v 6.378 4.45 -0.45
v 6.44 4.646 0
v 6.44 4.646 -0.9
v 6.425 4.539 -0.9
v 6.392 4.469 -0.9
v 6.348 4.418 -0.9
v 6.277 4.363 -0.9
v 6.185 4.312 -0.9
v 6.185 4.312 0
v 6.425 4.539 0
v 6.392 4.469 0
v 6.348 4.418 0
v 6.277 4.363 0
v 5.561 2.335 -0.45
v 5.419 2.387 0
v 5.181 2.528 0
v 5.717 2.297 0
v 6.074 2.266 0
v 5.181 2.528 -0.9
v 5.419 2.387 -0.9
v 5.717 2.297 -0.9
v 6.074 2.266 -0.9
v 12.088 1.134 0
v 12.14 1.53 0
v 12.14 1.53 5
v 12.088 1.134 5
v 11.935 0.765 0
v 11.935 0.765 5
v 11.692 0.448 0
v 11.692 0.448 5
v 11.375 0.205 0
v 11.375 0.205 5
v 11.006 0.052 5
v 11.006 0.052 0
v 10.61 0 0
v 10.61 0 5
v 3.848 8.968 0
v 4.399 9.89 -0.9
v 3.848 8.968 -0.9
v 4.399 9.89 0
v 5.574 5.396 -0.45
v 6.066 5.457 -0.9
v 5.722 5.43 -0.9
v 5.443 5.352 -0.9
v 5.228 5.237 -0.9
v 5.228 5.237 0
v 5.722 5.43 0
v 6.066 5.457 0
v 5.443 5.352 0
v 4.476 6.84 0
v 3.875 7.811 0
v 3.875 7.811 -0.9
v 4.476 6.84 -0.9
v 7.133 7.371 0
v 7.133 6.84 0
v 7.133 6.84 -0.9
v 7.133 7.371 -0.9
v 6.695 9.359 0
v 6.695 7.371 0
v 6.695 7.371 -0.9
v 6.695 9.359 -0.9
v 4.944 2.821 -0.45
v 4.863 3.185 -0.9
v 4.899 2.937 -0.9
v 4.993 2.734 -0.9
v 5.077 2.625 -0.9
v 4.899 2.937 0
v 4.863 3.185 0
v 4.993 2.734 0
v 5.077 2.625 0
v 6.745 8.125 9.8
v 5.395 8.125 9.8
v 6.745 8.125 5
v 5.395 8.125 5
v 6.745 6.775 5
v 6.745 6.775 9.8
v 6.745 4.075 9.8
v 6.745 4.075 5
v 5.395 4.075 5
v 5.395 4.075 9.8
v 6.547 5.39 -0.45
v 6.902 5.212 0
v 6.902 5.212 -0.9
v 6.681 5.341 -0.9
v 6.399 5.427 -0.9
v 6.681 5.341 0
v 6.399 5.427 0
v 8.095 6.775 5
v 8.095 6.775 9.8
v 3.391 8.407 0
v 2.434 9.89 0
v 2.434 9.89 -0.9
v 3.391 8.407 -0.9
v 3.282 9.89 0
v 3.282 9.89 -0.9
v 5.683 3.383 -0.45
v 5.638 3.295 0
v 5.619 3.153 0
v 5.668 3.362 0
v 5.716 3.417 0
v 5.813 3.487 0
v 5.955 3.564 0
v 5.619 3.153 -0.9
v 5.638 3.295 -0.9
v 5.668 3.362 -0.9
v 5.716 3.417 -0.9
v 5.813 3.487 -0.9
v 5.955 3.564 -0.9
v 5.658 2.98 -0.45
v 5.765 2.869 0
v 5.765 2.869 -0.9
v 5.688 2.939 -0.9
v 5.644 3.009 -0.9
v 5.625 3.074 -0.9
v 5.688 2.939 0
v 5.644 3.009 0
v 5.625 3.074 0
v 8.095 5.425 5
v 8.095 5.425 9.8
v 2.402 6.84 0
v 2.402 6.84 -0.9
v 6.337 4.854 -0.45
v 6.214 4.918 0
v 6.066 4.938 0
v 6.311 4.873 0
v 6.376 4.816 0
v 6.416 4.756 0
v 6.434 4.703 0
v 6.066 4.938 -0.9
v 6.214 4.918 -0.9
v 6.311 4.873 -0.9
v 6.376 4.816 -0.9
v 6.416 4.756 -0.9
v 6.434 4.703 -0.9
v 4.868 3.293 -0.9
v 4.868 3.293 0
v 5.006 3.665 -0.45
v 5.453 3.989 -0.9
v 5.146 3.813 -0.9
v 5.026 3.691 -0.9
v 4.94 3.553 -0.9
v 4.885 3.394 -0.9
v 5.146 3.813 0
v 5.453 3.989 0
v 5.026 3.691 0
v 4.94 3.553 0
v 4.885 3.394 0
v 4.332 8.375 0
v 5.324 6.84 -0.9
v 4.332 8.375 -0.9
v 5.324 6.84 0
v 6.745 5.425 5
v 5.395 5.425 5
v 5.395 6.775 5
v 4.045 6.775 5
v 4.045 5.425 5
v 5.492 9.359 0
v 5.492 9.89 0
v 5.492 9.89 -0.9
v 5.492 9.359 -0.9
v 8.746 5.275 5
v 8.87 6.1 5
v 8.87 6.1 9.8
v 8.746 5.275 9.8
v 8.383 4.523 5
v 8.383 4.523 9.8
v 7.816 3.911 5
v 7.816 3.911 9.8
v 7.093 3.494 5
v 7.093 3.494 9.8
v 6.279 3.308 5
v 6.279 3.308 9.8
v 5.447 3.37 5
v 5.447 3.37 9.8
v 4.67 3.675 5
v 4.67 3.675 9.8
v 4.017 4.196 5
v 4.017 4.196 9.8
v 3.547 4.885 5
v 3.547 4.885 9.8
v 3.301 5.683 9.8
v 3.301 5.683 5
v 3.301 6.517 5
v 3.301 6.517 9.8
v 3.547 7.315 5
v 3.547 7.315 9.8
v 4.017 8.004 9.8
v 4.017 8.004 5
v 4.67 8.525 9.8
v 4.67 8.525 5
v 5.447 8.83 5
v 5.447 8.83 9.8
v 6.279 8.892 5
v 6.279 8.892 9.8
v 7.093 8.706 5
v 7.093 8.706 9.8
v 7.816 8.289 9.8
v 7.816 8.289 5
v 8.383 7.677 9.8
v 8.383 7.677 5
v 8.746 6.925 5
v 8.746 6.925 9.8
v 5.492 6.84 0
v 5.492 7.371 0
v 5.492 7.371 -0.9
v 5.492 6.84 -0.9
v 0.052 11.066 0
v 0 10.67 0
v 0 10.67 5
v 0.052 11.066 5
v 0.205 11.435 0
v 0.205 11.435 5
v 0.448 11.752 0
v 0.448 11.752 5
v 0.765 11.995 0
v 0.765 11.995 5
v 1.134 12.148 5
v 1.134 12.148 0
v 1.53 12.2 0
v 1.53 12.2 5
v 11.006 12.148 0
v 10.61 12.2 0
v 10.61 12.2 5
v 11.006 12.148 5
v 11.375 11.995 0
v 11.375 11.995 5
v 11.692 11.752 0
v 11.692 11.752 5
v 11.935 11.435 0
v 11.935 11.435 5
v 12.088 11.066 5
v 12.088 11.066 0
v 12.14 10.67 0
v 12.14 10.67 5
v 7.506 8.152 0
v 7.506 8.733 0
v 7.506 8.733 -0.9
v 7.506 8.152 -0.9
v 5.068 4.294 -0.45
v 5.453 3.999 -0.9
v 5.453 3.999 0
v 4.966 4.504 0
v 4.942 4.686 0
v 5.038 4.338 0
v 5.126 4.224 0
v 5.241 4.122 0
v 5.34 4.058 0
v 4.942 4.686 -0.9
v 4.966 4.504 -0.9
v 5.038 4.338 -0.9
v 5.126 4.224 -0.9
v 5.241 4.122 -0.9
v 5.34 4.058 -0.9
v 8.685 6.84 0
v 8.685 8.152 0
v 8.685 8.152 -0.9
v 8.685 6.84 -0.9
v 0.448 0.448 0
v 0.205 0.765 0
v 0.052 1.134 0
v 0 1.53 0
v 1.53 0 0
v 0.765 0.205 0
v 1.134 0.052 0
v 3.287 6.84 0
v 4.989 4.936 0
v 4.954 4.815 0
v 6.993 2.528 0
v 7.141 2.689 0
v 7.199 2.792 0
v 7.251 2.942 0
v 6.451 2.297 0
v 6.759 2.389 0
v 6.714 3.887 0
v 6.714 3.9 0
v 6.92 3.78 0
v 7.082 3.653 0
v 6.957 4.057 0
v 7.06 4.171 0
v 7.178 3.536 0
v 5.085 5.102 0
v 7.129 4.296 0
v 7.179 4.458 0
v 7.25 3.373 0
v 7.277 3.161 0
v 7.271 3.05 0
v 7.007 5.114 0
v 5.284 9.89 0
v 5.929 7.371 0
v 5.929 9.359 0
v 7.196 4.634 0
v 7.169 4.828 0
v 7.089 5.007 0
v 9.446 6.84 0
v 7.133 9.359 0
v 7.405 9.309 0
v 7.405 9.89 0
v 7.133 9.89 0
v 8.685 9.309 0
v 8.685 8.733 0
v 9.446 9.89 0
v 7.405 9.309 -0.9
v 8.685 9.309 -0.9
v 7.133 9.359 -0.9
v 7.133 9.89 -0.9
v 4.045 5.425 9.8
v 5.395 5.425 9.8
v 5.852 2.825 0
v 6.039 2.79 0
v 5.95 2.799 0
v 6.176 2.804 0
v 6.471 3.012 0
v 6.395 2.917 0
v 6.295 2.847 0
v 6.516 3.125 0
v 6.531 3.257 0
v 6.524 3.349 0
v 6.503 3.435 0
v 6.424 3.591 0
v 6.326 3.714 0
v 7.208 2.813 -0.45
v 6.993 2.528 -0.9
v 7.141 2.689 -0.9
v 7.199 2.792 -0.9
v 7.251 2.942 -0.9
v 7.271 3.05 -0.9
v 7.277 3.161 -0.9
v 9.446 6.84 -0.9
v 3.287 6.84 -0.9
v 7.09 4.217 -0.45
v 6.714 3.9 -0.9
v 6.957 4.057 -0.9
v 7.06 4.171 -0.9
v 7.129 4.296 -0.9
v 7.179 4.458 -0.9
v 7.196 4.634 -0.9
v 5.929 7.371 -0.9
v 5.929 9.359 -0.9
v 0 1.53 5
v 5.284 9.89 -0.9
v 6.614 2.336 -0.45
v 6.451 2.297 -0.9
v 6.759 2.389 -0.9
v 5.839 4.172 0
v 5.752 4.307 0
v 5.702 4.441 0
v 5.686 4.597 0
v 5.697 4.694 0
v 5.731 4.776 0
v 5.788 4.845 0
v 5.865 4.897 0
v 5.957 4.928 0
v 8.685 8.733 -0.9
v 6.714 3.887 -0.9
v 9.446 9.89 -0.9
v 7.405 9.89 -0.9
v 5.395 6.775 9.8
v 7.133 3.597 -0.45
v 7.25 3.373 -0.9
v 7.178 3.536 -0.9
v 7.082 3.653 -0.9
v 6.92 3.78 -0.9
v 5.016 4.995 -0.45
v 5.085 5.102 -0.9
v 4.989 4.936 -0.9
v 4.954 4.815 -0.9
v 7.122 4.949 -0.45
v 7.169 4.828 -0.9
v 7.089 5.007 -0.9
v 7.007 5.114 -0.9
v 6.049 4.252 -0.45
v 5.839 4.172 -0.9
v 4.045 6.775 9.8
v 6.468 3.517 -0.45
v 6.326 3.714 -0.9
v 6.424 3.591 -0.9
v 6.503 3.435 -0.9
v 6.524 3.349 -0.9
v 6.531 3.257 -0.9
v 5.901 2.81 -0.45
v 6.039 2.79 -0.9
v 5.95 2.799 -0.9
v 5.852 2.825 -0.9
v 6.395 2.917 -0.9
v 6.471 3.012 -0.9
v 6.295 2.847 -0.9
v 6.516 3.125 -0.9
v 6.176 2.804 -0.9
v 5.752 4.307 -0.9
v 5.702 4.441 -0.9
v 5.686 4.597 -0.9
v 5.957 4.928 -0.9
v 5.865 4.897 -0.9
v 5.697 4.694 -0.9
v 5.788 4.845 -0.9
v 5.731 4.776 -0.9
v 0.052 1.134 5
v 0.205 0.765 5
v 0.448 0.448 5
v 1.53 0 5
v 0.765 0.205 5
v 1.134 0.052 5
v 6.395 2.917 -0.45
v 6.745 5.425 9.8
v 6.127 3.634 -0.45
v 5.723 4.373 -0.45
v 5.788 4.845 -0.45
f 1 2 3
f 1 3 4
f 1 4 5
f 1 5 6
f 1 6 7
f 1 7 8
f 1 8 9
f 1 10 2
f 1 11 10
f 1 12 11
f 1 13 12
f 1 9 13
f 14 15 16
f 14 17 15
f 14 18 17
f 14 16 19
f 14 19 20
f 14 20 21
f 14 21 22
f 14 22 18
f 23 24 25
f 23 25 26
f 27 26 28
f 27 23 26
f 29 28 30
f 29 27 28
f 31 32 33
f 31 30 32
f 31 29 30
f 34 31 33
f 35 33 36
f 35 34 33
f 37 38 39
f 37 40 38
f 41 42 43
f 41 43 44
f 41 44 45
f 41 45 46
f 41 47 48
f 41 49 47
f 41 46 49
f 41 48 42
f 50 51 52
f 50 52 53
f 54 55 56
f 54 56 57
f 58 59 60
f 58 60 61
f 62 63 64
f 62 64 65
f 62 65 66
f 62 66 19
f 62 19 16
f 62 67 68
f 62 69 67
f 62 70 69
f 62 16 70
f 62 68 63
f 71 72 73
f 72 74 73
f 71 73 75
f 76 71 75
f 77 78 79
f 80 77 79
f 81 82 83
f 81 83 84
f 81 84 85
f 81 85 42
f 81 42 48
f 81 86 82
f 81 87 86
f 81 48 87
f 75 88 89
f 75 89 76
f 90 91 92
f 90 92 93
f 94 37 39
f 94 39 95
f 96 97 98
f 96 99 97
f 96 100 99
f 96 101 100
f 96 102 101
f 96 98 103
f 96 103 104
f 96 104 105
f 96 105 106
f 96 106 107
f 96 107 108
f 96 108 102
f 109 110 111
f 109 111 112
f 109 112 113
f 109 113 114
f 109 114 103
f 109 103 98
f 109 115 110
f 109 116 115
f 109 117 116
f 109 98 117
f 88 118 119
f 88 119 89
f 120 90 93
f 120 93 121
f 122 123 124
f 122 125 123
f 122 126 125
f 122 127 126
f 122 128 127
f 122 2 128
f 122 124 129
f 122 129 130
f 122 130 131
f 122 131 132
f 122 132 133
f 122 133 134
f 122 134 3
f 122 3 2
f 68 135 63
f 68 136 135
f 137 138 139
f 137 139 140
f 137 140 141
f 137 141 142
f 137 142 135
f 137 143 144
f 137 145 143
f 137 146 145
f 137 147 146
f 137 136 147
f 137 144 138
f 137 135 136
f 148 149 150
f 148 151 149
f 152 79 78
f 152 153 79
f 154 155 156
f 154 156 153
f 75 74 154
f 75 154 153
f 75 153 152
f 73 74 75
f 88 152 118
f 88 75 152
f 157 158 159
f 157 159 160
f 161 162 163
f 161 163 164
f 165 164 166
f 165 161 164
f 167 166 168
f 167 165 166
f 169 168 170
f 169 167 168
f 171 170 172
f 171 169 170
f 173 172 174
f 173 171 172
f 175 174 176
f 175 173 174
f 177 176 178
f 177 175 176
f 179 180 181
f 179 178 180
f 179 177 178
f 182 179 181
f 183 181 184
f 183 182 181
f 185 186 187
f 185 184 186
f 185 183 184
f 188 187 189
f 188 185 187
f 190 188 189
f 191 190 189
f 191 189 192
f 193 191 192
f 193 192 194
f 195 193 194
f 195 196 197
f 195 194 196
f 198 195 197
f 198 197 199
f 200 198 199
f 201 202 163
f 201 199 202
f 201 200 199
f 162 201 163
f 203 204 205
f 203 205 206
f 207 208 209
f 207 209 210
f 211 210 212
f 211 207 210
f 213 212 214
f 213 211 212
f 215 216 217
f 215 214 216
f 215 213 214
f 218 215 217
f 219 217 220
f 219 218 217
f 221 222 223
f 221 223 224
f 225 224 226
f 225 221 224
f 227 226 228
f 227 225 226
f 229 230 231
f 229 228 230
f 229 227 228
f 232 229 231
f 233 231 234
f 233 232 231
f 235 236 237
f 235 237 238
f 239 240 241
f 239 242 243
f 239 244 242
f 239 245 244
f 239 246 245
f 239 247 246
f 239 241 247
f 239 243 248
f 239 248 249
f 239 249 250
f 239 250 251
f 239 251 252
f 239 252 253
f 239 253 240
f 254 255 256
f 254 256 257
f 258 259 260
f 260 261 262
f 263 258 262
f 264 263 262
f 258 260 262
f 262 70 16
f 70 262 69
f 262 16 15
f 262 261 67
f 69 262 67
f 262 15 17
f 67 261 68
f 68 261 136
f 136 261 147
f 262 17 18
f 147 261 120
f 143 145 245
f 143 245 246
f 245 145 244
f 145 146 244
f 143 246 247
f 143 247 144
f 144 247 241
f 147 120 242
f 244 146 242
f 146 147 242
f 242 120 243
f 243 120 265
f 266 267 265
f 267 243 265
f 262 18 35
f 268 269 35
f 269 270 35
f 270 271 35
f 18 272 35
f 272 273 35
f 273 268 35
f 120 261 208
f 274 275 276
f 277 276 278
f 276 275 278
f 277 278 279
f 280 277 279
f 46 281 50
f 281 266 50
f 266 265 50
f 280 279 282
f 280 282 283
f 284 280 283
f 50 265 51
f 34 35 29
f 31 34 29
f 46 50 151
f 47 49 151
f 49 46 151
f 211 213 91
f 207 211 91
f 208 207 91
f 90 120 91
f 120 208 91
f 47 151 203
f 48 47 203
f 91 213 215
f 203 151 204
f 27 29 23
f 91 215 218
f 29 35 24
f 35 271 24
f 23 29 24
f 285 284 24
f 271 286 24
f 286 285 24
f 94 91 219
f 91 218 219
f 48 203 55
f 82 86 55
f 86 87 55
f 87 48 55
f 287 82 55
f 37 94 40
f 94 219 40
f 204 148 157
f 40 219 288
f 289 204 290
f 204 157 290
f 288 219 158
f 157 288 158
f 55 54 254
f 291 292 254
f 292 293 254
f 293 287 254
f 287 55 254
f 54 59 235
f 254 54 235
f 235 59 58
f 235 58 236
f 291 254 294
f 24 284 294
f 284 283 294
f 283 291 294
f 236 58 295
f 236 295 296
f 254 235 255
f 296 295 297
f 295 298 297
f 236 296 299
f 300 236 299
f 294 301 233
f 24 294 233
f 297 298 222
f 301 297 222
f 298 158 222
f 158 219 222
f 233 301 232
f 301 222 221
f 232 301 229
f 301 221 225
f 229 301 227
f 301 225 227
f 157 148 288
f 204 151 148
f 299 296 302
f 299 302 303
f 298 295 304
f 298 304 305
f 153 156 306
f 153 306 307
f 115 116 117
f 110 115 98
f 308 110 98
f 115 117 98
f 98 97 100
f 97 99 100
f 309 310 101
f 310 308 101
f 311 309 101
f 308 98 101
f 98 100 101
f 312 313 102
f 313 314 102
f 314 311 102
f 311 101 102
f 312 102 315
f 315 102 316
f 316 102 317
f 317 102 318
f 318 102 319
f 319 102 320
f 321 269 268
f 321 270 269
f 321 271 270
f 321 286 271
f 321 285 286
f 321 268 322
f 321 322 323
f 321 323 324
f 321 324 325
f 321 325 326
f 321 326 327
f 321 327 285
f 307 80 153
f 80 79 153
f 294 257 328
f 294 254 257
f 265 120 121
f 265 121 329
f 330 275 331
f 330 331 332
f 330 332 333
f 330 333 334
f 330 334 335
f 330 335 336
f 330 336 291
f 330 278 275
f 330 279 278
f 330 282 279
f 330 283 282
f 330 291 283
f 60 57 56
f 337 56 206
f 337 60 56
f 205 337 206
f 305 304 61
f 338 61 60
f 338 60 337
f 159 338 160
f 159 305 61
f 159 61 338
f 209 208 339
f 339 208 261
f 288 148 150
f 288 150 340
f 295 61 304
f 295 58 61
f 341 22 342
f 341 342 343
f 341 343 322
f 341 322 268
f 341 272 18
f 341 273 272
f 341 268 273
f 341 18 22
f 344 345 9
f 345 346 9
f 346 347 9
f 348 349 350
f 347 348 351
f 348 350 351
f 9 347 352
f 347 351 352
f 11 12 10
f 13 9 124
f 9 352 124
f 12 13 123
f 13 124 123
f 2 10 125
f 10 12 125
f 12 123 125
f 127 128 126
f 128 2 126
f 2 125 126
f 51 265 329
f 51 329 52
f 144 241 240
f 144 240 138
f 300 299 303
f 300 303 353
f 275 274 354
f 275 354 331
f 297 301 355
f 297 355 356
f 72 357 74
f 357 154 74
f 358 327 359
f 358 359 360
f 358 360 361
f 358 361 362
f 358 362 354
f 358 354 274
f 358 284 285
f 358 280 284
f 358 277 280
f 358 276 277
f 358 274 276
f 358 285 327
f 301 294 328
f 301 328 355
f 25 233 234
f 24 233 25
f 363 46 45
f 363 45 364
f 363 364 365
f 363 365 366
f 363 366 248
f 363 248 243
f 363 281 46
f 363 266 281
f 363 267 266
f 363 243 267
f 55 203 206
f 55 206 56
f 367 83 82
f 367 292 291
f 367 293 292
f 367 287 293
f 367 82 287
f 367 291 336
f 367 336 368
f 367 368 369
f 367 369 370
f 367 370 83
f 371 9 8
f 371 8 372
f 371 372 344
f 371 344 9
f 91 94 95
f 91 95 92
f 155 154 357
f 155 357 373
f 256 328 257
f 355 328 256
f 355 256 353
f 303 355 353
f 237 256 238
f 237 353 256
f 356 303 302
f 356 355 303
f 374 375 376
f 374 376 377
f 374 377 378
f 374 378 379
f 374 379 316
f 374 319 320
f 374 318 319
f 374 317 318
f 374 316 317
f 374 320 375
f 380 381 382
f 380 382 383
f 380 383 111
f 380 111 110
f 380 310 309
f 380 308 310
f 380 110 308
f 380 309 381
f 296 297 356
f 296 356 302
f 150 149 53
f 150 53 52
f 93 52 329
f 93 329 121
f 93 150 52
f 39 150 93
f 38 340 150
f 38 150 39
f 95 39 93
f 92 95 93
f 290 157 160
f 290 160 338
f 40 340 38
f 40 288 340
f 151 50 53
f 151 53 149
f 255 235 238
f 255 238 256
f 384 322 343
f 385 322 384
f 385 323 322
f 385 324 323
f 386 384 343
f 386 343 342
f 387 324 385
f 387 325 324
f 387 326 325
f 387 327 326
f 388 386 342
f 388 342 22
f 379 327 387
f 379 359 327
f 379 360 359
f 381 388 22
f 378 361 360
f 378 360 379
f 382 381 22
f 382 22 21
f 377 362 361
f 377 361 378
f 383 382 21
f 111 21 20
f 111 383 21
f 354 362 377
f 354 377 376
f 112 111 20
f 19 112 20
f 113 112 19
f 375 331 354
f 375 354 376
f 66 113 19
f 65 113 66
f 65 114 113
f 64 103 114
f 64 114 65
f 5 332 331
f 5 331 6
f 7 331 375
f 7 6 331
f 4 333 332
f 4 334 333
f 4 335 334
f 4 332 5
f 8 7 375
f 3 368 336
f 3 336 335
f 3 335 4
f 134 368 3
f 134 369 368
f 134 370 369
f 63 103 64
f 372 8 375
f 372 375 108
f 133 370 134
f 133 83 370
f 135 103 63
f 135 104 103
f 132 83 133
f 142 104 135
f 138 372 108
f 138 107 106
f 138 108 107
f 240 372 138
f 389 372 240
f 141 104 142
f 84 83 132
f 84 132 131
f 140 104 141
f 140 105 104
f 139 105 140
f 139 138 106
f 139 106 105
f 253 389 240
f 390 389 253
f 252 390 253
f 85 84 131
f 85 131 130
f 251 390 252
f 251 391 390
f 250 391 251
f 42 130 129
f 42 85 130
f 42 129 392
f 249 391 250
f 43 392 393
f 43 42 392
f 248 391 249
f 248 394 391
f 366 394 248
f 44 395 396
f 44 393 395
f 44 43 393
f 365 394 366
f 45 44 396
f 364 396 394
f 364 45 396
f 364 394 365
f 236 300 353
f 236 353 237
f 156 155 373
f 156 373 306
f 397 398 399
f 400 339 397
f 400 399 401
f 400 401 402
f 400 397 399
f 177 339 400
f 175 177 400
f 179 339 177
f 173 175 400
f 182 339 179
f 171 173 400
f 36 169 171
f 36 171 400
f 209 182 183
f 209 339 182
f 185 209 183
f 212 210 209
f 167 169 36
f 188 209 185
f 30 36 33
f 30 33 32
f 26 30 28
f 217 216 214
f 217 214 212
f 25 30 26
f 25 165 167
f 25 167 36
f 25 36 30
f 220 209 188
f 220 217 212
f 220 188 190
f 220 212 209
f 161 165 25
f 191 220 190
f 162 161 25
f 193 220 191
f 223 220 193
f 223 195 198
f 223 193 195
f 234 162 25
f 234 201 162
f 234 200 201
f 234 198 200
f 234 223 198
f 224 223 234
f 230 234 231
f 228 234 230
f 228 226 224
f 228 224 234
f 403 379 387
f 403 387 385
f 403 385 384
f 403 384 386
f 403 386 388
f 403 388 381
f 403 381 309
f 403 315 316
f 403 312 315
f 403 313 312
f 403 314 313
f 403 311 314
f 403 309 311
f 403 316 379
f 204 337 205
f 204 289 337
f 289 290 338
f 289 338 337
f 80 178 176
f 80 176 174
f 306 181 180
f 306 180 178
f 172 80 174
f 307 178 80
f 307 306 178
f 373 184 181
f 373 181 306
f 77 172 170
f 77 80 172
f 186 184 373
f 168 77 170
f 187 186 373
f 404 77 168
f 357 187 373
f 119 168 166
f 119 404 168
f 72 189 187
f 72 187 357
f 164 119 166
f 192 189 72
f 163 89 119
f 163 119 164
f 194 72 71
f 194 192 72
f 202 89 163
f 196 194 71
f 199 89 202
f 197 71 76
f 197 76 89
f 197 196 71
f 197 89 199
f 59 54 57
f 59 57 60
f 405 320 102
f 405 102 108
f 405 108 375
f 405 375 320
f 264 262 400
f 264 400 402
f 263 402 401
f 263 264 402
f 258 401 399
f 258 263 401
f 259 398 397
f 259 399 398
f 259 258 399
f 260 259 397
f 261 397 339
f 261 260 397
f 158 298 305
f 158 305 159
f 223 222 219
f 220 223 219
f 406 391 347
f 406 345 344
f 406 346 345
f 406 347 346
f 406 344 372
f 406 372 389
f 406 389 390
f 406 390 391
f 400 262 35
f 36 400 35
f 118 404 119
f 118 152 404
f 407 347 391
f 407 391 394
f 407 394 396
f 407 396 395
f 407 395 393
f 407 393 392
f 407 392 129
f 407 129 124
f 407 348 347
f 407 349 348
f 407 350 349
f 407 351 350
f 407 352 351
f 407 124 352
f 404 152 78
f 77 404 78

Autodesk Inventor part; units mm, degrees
ref_plane "YZ Plane" through (0, 0, 0) normal (1, 0, 0) x (0, 1, 0)
ref_plane "XZ Plane" through (0, 0, 0) normal (0, 1, 0) x (-1, 0, 0)
sketch "Sketch1" plane through (0, 0, 0) normal (0, 0, 1) x (1, 0, 0)
  line L0 (14.6962, 12.74) -> (14.6962, 0) construction
  line L1 (10.61, 12.2) -> (1.53, 12.2)
  arc A0 (1.53, 12.2) -> (0, 10.67) centre (1.53, 10.67) ccw
  line L2 (0, 10.67) -> (0, 1.53)
  arc A1 (0, 1.53) -> (1.53, 0) centre (1.53, 1.53) ccw
  line L3 (1.53, 0) -> (10.61, 0)
  arc A2 (10.61, 0) -> (12.14, 1.53) centre (10.61, 1.53) ccw
  arc A3 (12.14, 10.67) -> (10.61, 12.2) centre (10.61, 10.67) ccw
  line L4 (12.14, 10.67) -> (12.14, 1.53)
  point P0 (0, 0)
  point P1 (0, 0)
  dimension "d10" = 12.74
ref_plane "Work Plane1" through (0, 0, 5) normal (0, 0, 1) x (1, 0, 0)
sketch "Sketch2" plane through (0, 0, 5) normal (0, 0, 1) x (1, 0, 0)
  line L0 (10.88, 12.74) -> (1.8, 12.74) projected
  line L1 (10.88, 12.74) -> (1.8, 12.74) projected
  arc A0 (1.8, 12.74) -> (0, 10.94) centre (1.8, 10.94) ccw projected
  line L2 (0, 10.94) -> (0, 1.8) projected
  arc A1 (0, 1.8) -> (1.8, 0) centre (1.8, 1.8) ccw projected
  line L3 (1.8, 0) -> (10.88, 0) projected
  arc A2 (10.88, 0) -> (12.68, 1.8) centre (10.88, 1.8) ccw projected
  line L4 (12.68, 1.8) -> (12.68, 10.94) projected
  arc A3 (12.68, 10.94) -> (10.88, 12.74) centre (10.88, 10.94) ccw projected
  circle A4 centre (6.34, 6.37) radius 2.8
  line L5 (5.665, 8.395) -> (7.015, 8.395)
  line L6 (7.015, 4.345) -> (5.665, 4.345)
  line L7 (5.665, 4.345) -> (7.015, 8.395) construction
  line L8 (5.665, 8.395) -> (7.015, 4.345) construction
  line L9 (8.365, 5.695) -> (8.365, 7.045)
  line L10 (4.315, 7.045) -> (4.315, 5.695)
  line L11 (4.315, 5.695) -> (8.365, 7.045) construction
  line L12 (8.365, 5.695) -> (4.315, 7.045) construction
  line L13 (4.315, 5.695) -> (5.665, 5.695)
  line L14 (7.015, 5.695) -> (8.365, 5.695)
  line L15 (5.665, 4.345) -> (5.665, 5.695)
  line L16 (5.665, 7.045) -> (5.665, 8.395)
  line L17 (8.365, 7.045) -> (7.015, 7.045)
  line L18 (5.665, 7.045) -> (4.315, 7.045)
  line L19 (7.015, 8.395) -> (7.015, 7.045)
  line L20 (7.015, 5.695) -> (7.015, 4.345)
  point P0 (0, 0)
  dimension "d3" = 5.6
  dimension "d4" = 4.05
  dimension "d5" = 1.35
  dimension "d6" = 4.05
  dimension "d7" = 1.35
extrude "Extrusion3" add sketch "Sketch1" along normal blind 5
sketch "Sketch3" plane through (0, 0, 5) normal (0, 0, 1) x (1, 0, 0)
  line L0 (10.61, 12.47) -> (1.53, 12.47)
  line L1 (10.61, 12.47) -> (1.53, 12.47)
  arc A0 (1.53, 12.47) -> (-0.27, 10.67) centre (1.53, 10.67) ccw
  line L2 (-0.27, 10.67) -> (-0.27, 1.53)
  arc A1 (-0.27, 1.53) -> (1.53, -0.27) centre (1.53, 1.53) ccw
  line L3 (1.53, -0.27) -> (10.61, -0.27)
  arc A2 (10.61, -0.27) -> (12.41, 1.53) centre (10.61, 1.53) ccw
  line L4 (12.41, 1.53) -> (12.41, 10.67)
  arc A3 (12.41, 10.67) -> (10.61, 12.47) centre (10.61, 10.67) ccw
  circle A4 centre (6.07, 6.1) radius 2.8
  line L5 (5.395, 8.125) -> (6.745, 8.125)
  line L6 (6.745, 4.075) -> (5.395, 4.075)
  line L7 (5.395, 4.075) -> (6.745, 8.125) construction
  line L8 (5.395, 8.125) -> (6.745, 4.075) construction
  line L9 (8.095, 5.425) -> (8.095, 6.775)
  line L10 (4.045, 6.775) -> (4.045, 5.425)
  line L11 (4.045, 5.425) -> (8.095, 6.775) construction
  line L12 (8.095, 5.425) -> (4.045, 6.775) construction
  line L13 (4.045, 5.425) -> (5.395, 5.425)
  line L14 (6.745, 5.425) -> (8.095, 5.425)
  line L15 (5.395, 4.075) -> (5.395, 5.425)
  line L16 (5.395, 6.775) -> (5.395, 8.125)
  line L17 (8.095, 6.775) -> (6.745, 6.775)
  line L18 (5.395, 6.775) -> (4.045, 6.775)
  line L19 (6.745, 8.125) -> (6.745, 6.775)
  line L20 (6.745, 5.425) -> (6.745, 4.075)
  line L21 (10.61, 12.2) -> (1.53, 12.2) projected
  line L22 (0, 10.67) -> (0, 1.53) projected
  point P0 (0, 0)
  point P1 (-0.27, -0.27)
  point P2 (6.07, 12.2)
  point P3 (0, 6.1)
  point P4 (6.07, 6.1)
  dimension "d14" = 5.6
  dimension "d15" = 4.05
  dimension "d16" = 1.35
  dimension "d17" = 4.05
  dimension "d18" = 1.35
extrude "Extrusion4" add sketch "Sketch3" along normal blind 4.8 contours A4
sketch "Sketch4" plane through (0, 0, 0) normal (0, 0, -1) x (-1, 0, 0)
  line L0 (-13.9436, 0) -> (-13.9436, 2.266)
  line L1 (-15.5559, 0) -> (-15.5559, 6.84)
  line L2 (-1.53, 0) -> (-10.61, 0) projected
  line L3 (-9.7626, 9.89) -> (-2.3774, 9.89) construction
  line L4 (-2.3774, 9.89) -> (-2.3774, 6.84) construction
  line L5 (-2.3774, 6.84) -> (-9.7626, 6.84) construction
  line L6 (-9.7626, 6.84) -> (-9.7626, 9.89) construction
  line L7 (-7.4059, 5.4569) -> (-4.7341, 5.4569) construction
  line L8 (-4.7341, 5.4569) -> (-4.7341, 2.266) construction
  line L9 (-4.7341, 2.266) -> (-7.4059, 2.266) construction
  line L10 (-7.4059, 2.266) -> (-7.4059, 5.4569) construction
  line L11 (-7.4047, 9.3092) -> (-8.685, 9.3092)
  line L12 (-8.685, 9.3092) -> (-8.685, 8.7333)
  line L13 (-8.685, 8.7333) -> (-7.506, 8.7333)
  line L14 (-7.506, 8.7333) -> (-7.506, 8.1524)
  line L15 (-7.506, 8.1524) -> (-8.685, 8.1524)
  line L16 (-8.685, 8.1524) -> (-8.685, 6.84)
  line L17 (-8.685, 6.84) -> (-9.4463, 6.84)
  line L18 (-9.4463, 6.84) -> (-9.4463, 9.89)
  line L19 (-9.4463, 9.89) -> (-7.4047, 9.89)
  line L20 (-7.4047, 9.89) -> (-7.4047, 9.3092)
  line L21 (-5.4916, 6.84) -> (-7.1328, 6.84)
  line L22 (-7.1328, 6.84) -> (-7.1328, 7.3714)
  line L23 (-7.1328, 7.3714) -> (-6.6953, 7.3714)
  line L24 (-6.6953, 7.3714) -> (-6.6953, 9.3586)
  line L25 (-6.6953, 9.3586) -> (-7.1328, 9.3586)
  line L26 (-7.1328, 9.3586) -> (-7.1328, 9.89)
  line L27 (-7.1328, 9.89) -> (-5.4916, 9.89)
  line L28 (-5.4916, 9.89) -> (-5.4916, 9.3586)
  line L29 (-5.4916, 9.3586) -> (-5.9291, 9.3586)
  line L30 (-5.9291, 9.3586) -> (-5.9291, 7.3714)
  line L31 (-5.9291, 7.3714) -> (-5.4916, 7.3714)
  line L32 (-5.4916, 7.3714) -> (-5.4916, 6.84)
  line L33 (-2.4021, 6.84) -> (-3.2869, 6.84)
  line L34 (-3.2869, 6.84) -> (-3.8752, 7.8114)
  line L35 (-3.8752, 7.8114) -> (-4.4758, 6.84)
  line L36 (-4.4758, 6.84) -> (-5.3236, 6.84)
  line L37 (-5.3236, 6.84) -> (-4.3324, 8.3749)
  line L38 (-4.3324, 8.3749) -> (-5.284, 9.89)
  line L39 (-5.284, 9.89) -> (-4.3992, 9.89)
  line L40 (-4.3992, 9.89) -> (-3.848, 8.9681)
  line L41 (-3.848, 8.9681) -> (-3.282, 9.89)
  line L42 (-3.282, 9.89) -> (-2.4342, 9.89)
  line L43 (-2.4342, 9.89) -> (-3.3907, 8.407)
  line L44 (-3.3907, 8.407) -> (-2.4021, 6.84)
  spline S0 degree 2 poles (-4.8626, 3.1854) (-4.8626, 2.9902) (-5.0257, 2.6516) (-5.1814, 2.528) knots 0 0 0 1 2 2 2
  spline S1 degree 2 poles (-5.1814, 2.528) (-5.3372, 2.4044) (-5.7845, 2.266) (-6.0737, 2.266) knots 0 0 0 1 2 2 2
  spline S2 degree 2 poles (-6.0737, 2.266) (-6.3827, 2.266) (-6.8449, 2.4069) (-6.9932, 2.528) knots 0 0 0 1 2 2 2
  spline S3 degree 2 poles (-6.9932, 2.528) (-7.139, 2.6491) (-7.2774, 2.9778) (-7.2774, 3.1607) knots 0 0 0 1 2 2 2
  spline S4 degree 2 poles (-7.2774, 3.1607) (-7.2774, 3.4227) (-6.9882, 3.7712) (-6.7139, 3.8874) knots 0 0 0 1 2 2 2
  line L45 (-6.7139, 3.8874) -> (-6.7139, 3.8998)
  spline S5 degree 2 poles (-6.7139, 3.8998) (-6.9833, 4.0307) (-7.1958, 4.404) (-7.1958, 4.6338) knots 0 0 0 1 2 2 2
  spline S6 degree 2 poles (-7.1958, 4.6338) (-7.1958, 4.8019) (-7.0475, 5.096) (-6.9017, 5.2122) knots 0 0 0 1 2 2 2
  spline S7 degree 2 poles (-6.9017, 5.2122) (-6.7608, 5.3234) (-6.3332, 5.4569) (-6.0663, 5.4569) knots 0 0 0 1 2 2 2
  spline S8 degree 2 poles (-6.0663, 5.4569) (-5.7845, 5.4569) (-5.3643, 5.3358) (-5.2284, 5.2369) knots 0 0 0 1 2 2 2
  spline S9 degree 2 poles (-5.2284, 5.2369) (-5.09, 5.138) (-4.9417, 4.8513) (-4.9417, 4.6857) knots 0 0 0 1 2 2 2
  spline S10 degree 2 poles (-4.9417, 4.6857) (-4.9417, 4.4682) (-5.1938, 4.1197) (-5.4533, 3.9986) knots 0 0 0 1 2 2 2
  line L46 (-5.4533, 3.9986) -> (-5.4533, 3.9887)
  spline S11 degree 2 poles (-5.4533, 3.9887) (-5.1493, 3.8651) (-4.8626, 3.4647) (-4.8626, 3.1854) knots 0 0 0 1 2 2 2
  spline S12 degree 2 poles (-5.6189, 3.1533) (-5.6189, 3.3041) (-5.7475, 3.4623) (-5.9551, 3.5636) knots 0 0 0 1 2 2 2
  spline S13 degree 2 poles (-5.9551, 3.5636) (-6.0144, 3.5908) (-6.2393, 3.6773) (-6.3258, 3.7144) knots 0 0 0 1 2 2 2
  spline S14 degree 2 poles (-6.3258, 3.7144) (-6.4049, 3.6353) (-6.531, 3.398) (-6.531, 3.2571) knots 0 0 0 1 2 2 2
  spline S15 degree 2 poles (-6.531, 3.2571) (-6.531, 3.0446) (-6.2591, 2.79) (-6.0391, 2.79) knots 0 0 0 1 2 2 2
  spline S16 degree 2 poles (-6.0391, 2.79) (-5.9773, 2.79) (-5.8241, 2.8295) (-5.7648, 2.8691) knots 0 0 0 1 2 2 2
  spline S17 degree 2 poles (-5.7648, 2.8691) (-5.698, 2.916) (-5.6189, 3.0446) (-5.6189, 3.1533) knots 0 0 0 1 2 2 2
  spline S18 degree 2 poles (-5.6857, 4.5968) (-5.6857, 4.7525) (-5.8908, 4.9378) (-6.0663, 4.9378) knots 0 0 0 1 2 2 2
  spline S19 degree 2 poles (-6.0663, 4.9378) (-6.2344, 4.9378) (-6.4395, 4.7698) (-6.4395, 4.6462) knots 0 0 0 1 2 2 2
  spline S20 degree 2 poles (-6.4395, 4.6462) (-6.4395, 4.5251) (-6.3159, 4.3743) (-6.1849, 4.3125) knots 0 0 0 1 2 2 2
  spline S21 degree 2 poles (-6.1849, 4.3125) (-6.1281, 4.2829) (-5.9699, 4.2211) (-5.8389, 4.1716) knots 0 0 0 1 2 2 2
  spline S22 degree 2 poles (-5.8389, 4.1716) (-5.7598, 4.2754) (-5.6857, 4.4707) (-5.6857, 4.5968) knots 0 0 0 1 2 2 2
  point P0 (0, 0)
  point P1 (-6.07, 0)
  point P2 (-6.07, 2.266)
  point P3 (-6.07, 6.84)
  point P4 (-6.07, 6.84)
  point P5 (-6.07, 2.266)
  dimension "d21" = 2.266
  dimension "d22" = 6.84
extrude "Extrusion5" add sketch "Sketch4" along normal blind 0.9
properties part number "IPC FIX 8"
